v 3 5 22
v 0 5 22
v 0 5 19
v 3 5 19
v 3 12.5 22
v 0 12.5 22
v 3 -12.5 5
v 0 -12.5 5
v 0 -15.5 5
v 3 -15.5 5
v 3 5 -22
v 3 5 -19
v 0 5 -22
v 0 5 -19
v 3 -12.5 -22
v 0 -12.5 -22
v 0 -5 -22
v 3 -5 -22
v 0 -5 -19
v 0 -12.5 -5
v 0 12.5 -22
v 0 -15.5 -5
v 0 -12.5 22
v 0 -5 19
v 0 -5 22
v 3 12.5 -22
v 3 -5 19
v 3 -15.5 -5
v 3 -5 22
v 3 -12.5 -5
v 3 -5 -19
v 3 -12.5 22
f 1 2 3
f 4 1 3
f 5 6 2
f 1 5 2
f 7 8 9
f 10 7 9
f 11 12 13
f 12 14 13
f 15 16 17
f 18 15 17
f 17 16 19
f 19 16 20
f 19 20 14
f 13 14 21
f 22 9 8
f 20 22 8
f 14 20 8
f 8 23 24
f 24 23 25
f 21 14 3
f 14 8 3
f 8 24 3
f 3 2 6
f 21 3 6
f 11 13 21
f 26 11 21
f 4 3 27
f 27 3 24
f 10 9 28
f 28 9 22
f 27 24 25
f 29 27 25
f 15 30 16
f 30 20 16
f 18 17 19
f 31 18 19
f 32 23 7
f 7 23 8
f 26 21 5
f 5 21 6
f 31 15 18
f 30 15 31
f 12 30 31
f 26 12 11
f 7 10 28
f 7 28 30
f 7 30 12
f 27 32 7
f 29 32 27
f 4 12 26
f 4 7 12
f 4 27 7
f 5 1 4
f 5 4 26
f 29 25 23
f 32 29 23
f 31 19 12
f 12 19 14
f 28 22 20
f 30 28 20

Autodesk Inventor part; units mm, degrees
ref_plane "YZ Plane" through (0, 0, 0) normal (1, 0, 0) x (0, 1, 0)
ref_plane "XZ Plane" through (0, 0, 0) normal (0, 1, 0) x (-1, 0, 0)
ref_plane "XY Plane" through (0, 0, 0) normal (0, 0, 1) x (1, 0, 0)
sketch "Sketch1" plane through (0, 0, 0) normal (1, 0, 0) x (0, 1, 0)
  line L0 (-12.5, -22) -> (12.5, -22)
  line L1 (12.5, -22) -> (12.5, 22)
  line L2 (12.5, 22) -> (-12.5, 22)
  line L3 (-12.5, 22) -> (-12.5, -22)
  line L4 (-12.5, -22) -> (12.5, 22) construction
  line L5 (12.5, -22) -> (-12.5, 22) construction
  point P0 (0, 0)
  dimension "d0" = 25
  dimension "d1" = 44
extrude "Extrusion1" add sketch "Sketch1" along normal blind 3
sketch "Sketch2" plane through (0, 0, 0) normal (-1, 0, 0) x (0, 0, 1)
  line L0 (-5, -12.5) -> (5, -12.5)
  line L1 (5, -12.5) -> (5, -15.5)
  line L2 (5, -15.5) -> (-5, -15.5)
  line L3 (-5, -15.5) -> (-5, -12.5)
  line L4 (22, -12.5) -> (-22, -12.5) projected
  point P0 (0, 0)
  point P1 (0, -15.5)
  dimension "d4" = 10
  dimension "d5" = 3
extrude "Extrusion2" add sketch "Sketch2" against normal blind 3
sketch "Sketch3" plane through (0, 0, 0) normal (-1, 0, 0) x (0, 0, 1)
  line L0 (22, 12.5) -> (22, -12.5) projected
  line L1 (22, 5) -> (19, 5)
  line L2 (19, 5) -> (19, -5)
  line L3 (19, -5) -> (22, -5)
  line L4 (22, -5) -> (22, 5)
  point P0 (0, 0)
  point P1 (19, 0)
  dimension "d8" = 3
  dimension "d9" = 10
extrude "Extrusion3" cut sketch "Sketch3" against normal blind 3
mirror "Mirror1" about plane through (0, 0, 0) normal (0, 0, 1) of "Extrusion3"
properties part number "battery holder ends"
